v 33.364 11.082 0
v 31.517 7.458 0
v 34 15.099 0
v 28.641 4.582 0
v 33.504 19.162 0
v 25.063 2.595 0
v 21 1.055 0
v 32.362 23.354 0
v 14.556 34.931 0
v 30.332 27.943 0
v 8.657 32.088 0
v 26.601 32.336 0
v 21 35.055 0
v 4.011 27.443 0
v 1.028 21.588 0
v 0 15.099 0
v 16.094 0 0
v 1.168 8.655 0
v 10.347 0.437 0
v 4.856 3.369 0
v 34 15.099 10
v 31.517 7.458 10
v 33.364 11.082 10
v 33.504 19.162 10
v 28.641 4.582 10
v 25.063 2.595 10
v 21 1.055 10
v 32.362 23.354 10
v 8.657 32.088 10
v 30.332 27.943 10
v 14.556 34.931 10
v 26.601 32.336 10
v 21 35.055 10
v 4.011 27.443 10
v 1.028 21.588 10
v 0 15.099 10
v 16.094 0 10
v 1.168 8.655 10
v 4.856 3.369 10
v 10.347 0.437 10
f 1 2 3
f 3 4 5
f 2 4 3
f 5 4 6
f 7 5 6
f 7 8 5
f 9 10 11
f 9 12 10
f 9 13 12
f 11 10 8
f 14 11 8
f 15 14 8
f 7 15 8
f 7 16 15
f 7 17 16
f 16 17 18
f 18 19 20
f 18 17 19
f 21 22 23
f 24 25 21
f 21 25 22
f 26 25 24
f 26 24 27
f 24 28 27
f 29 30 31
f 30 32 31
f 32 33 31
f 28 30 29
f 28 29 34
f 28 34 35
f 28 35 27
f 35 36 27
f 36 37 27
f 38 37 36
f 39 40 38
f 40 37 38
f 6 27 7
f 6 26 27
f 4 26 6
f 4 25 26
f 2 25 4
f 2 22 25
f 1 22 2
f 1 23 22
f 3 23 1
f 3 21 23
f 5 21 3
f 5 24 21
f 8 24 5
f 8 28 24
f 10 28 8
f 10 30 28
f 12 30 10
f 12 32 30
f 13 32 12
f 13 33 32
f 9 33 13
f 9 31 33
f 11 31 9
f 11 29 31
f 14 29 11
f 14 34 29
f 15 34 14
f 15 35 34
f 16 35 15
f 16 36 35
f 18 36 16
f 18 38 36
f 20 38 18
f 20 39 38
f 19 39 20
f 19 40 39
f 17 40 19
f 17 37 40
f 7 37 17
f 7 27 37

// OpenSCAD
$fn = 32;

// ----------------------------------------------------------------------
// Cam disc: base radius 13.0 mm, lift 8.0 mm, 20 profile points
// ----------------------------------------------------------------------

// --- parameters (mm) ---
profile_height = 10;      // extrusion height
profile_points = 20;      // points of the closed outline

profile = [[34, 15.099], [33.504, 19.162], [32.362, 23.354], [30.332, 27.943], [26.601, 32.336], [21, 35.055], [14.556, 34.931], [8.657, 32.088], [4.011, 27.443], [1.028, 21.588], [0, 15.099], [1.168, 8.655], [4.856, 3.369], [10.347, 0.437], [16.094, 0], [21, 1.055], [25.063, 2.595], [28.641, 4.582], [31.517, 7.458], [33.364, 11.082]];  // single closed polygon, 20 points, counter clockwise

// --- the one profile operation ---
linear_extrude(height = profile_height) polygon(points = profile);
